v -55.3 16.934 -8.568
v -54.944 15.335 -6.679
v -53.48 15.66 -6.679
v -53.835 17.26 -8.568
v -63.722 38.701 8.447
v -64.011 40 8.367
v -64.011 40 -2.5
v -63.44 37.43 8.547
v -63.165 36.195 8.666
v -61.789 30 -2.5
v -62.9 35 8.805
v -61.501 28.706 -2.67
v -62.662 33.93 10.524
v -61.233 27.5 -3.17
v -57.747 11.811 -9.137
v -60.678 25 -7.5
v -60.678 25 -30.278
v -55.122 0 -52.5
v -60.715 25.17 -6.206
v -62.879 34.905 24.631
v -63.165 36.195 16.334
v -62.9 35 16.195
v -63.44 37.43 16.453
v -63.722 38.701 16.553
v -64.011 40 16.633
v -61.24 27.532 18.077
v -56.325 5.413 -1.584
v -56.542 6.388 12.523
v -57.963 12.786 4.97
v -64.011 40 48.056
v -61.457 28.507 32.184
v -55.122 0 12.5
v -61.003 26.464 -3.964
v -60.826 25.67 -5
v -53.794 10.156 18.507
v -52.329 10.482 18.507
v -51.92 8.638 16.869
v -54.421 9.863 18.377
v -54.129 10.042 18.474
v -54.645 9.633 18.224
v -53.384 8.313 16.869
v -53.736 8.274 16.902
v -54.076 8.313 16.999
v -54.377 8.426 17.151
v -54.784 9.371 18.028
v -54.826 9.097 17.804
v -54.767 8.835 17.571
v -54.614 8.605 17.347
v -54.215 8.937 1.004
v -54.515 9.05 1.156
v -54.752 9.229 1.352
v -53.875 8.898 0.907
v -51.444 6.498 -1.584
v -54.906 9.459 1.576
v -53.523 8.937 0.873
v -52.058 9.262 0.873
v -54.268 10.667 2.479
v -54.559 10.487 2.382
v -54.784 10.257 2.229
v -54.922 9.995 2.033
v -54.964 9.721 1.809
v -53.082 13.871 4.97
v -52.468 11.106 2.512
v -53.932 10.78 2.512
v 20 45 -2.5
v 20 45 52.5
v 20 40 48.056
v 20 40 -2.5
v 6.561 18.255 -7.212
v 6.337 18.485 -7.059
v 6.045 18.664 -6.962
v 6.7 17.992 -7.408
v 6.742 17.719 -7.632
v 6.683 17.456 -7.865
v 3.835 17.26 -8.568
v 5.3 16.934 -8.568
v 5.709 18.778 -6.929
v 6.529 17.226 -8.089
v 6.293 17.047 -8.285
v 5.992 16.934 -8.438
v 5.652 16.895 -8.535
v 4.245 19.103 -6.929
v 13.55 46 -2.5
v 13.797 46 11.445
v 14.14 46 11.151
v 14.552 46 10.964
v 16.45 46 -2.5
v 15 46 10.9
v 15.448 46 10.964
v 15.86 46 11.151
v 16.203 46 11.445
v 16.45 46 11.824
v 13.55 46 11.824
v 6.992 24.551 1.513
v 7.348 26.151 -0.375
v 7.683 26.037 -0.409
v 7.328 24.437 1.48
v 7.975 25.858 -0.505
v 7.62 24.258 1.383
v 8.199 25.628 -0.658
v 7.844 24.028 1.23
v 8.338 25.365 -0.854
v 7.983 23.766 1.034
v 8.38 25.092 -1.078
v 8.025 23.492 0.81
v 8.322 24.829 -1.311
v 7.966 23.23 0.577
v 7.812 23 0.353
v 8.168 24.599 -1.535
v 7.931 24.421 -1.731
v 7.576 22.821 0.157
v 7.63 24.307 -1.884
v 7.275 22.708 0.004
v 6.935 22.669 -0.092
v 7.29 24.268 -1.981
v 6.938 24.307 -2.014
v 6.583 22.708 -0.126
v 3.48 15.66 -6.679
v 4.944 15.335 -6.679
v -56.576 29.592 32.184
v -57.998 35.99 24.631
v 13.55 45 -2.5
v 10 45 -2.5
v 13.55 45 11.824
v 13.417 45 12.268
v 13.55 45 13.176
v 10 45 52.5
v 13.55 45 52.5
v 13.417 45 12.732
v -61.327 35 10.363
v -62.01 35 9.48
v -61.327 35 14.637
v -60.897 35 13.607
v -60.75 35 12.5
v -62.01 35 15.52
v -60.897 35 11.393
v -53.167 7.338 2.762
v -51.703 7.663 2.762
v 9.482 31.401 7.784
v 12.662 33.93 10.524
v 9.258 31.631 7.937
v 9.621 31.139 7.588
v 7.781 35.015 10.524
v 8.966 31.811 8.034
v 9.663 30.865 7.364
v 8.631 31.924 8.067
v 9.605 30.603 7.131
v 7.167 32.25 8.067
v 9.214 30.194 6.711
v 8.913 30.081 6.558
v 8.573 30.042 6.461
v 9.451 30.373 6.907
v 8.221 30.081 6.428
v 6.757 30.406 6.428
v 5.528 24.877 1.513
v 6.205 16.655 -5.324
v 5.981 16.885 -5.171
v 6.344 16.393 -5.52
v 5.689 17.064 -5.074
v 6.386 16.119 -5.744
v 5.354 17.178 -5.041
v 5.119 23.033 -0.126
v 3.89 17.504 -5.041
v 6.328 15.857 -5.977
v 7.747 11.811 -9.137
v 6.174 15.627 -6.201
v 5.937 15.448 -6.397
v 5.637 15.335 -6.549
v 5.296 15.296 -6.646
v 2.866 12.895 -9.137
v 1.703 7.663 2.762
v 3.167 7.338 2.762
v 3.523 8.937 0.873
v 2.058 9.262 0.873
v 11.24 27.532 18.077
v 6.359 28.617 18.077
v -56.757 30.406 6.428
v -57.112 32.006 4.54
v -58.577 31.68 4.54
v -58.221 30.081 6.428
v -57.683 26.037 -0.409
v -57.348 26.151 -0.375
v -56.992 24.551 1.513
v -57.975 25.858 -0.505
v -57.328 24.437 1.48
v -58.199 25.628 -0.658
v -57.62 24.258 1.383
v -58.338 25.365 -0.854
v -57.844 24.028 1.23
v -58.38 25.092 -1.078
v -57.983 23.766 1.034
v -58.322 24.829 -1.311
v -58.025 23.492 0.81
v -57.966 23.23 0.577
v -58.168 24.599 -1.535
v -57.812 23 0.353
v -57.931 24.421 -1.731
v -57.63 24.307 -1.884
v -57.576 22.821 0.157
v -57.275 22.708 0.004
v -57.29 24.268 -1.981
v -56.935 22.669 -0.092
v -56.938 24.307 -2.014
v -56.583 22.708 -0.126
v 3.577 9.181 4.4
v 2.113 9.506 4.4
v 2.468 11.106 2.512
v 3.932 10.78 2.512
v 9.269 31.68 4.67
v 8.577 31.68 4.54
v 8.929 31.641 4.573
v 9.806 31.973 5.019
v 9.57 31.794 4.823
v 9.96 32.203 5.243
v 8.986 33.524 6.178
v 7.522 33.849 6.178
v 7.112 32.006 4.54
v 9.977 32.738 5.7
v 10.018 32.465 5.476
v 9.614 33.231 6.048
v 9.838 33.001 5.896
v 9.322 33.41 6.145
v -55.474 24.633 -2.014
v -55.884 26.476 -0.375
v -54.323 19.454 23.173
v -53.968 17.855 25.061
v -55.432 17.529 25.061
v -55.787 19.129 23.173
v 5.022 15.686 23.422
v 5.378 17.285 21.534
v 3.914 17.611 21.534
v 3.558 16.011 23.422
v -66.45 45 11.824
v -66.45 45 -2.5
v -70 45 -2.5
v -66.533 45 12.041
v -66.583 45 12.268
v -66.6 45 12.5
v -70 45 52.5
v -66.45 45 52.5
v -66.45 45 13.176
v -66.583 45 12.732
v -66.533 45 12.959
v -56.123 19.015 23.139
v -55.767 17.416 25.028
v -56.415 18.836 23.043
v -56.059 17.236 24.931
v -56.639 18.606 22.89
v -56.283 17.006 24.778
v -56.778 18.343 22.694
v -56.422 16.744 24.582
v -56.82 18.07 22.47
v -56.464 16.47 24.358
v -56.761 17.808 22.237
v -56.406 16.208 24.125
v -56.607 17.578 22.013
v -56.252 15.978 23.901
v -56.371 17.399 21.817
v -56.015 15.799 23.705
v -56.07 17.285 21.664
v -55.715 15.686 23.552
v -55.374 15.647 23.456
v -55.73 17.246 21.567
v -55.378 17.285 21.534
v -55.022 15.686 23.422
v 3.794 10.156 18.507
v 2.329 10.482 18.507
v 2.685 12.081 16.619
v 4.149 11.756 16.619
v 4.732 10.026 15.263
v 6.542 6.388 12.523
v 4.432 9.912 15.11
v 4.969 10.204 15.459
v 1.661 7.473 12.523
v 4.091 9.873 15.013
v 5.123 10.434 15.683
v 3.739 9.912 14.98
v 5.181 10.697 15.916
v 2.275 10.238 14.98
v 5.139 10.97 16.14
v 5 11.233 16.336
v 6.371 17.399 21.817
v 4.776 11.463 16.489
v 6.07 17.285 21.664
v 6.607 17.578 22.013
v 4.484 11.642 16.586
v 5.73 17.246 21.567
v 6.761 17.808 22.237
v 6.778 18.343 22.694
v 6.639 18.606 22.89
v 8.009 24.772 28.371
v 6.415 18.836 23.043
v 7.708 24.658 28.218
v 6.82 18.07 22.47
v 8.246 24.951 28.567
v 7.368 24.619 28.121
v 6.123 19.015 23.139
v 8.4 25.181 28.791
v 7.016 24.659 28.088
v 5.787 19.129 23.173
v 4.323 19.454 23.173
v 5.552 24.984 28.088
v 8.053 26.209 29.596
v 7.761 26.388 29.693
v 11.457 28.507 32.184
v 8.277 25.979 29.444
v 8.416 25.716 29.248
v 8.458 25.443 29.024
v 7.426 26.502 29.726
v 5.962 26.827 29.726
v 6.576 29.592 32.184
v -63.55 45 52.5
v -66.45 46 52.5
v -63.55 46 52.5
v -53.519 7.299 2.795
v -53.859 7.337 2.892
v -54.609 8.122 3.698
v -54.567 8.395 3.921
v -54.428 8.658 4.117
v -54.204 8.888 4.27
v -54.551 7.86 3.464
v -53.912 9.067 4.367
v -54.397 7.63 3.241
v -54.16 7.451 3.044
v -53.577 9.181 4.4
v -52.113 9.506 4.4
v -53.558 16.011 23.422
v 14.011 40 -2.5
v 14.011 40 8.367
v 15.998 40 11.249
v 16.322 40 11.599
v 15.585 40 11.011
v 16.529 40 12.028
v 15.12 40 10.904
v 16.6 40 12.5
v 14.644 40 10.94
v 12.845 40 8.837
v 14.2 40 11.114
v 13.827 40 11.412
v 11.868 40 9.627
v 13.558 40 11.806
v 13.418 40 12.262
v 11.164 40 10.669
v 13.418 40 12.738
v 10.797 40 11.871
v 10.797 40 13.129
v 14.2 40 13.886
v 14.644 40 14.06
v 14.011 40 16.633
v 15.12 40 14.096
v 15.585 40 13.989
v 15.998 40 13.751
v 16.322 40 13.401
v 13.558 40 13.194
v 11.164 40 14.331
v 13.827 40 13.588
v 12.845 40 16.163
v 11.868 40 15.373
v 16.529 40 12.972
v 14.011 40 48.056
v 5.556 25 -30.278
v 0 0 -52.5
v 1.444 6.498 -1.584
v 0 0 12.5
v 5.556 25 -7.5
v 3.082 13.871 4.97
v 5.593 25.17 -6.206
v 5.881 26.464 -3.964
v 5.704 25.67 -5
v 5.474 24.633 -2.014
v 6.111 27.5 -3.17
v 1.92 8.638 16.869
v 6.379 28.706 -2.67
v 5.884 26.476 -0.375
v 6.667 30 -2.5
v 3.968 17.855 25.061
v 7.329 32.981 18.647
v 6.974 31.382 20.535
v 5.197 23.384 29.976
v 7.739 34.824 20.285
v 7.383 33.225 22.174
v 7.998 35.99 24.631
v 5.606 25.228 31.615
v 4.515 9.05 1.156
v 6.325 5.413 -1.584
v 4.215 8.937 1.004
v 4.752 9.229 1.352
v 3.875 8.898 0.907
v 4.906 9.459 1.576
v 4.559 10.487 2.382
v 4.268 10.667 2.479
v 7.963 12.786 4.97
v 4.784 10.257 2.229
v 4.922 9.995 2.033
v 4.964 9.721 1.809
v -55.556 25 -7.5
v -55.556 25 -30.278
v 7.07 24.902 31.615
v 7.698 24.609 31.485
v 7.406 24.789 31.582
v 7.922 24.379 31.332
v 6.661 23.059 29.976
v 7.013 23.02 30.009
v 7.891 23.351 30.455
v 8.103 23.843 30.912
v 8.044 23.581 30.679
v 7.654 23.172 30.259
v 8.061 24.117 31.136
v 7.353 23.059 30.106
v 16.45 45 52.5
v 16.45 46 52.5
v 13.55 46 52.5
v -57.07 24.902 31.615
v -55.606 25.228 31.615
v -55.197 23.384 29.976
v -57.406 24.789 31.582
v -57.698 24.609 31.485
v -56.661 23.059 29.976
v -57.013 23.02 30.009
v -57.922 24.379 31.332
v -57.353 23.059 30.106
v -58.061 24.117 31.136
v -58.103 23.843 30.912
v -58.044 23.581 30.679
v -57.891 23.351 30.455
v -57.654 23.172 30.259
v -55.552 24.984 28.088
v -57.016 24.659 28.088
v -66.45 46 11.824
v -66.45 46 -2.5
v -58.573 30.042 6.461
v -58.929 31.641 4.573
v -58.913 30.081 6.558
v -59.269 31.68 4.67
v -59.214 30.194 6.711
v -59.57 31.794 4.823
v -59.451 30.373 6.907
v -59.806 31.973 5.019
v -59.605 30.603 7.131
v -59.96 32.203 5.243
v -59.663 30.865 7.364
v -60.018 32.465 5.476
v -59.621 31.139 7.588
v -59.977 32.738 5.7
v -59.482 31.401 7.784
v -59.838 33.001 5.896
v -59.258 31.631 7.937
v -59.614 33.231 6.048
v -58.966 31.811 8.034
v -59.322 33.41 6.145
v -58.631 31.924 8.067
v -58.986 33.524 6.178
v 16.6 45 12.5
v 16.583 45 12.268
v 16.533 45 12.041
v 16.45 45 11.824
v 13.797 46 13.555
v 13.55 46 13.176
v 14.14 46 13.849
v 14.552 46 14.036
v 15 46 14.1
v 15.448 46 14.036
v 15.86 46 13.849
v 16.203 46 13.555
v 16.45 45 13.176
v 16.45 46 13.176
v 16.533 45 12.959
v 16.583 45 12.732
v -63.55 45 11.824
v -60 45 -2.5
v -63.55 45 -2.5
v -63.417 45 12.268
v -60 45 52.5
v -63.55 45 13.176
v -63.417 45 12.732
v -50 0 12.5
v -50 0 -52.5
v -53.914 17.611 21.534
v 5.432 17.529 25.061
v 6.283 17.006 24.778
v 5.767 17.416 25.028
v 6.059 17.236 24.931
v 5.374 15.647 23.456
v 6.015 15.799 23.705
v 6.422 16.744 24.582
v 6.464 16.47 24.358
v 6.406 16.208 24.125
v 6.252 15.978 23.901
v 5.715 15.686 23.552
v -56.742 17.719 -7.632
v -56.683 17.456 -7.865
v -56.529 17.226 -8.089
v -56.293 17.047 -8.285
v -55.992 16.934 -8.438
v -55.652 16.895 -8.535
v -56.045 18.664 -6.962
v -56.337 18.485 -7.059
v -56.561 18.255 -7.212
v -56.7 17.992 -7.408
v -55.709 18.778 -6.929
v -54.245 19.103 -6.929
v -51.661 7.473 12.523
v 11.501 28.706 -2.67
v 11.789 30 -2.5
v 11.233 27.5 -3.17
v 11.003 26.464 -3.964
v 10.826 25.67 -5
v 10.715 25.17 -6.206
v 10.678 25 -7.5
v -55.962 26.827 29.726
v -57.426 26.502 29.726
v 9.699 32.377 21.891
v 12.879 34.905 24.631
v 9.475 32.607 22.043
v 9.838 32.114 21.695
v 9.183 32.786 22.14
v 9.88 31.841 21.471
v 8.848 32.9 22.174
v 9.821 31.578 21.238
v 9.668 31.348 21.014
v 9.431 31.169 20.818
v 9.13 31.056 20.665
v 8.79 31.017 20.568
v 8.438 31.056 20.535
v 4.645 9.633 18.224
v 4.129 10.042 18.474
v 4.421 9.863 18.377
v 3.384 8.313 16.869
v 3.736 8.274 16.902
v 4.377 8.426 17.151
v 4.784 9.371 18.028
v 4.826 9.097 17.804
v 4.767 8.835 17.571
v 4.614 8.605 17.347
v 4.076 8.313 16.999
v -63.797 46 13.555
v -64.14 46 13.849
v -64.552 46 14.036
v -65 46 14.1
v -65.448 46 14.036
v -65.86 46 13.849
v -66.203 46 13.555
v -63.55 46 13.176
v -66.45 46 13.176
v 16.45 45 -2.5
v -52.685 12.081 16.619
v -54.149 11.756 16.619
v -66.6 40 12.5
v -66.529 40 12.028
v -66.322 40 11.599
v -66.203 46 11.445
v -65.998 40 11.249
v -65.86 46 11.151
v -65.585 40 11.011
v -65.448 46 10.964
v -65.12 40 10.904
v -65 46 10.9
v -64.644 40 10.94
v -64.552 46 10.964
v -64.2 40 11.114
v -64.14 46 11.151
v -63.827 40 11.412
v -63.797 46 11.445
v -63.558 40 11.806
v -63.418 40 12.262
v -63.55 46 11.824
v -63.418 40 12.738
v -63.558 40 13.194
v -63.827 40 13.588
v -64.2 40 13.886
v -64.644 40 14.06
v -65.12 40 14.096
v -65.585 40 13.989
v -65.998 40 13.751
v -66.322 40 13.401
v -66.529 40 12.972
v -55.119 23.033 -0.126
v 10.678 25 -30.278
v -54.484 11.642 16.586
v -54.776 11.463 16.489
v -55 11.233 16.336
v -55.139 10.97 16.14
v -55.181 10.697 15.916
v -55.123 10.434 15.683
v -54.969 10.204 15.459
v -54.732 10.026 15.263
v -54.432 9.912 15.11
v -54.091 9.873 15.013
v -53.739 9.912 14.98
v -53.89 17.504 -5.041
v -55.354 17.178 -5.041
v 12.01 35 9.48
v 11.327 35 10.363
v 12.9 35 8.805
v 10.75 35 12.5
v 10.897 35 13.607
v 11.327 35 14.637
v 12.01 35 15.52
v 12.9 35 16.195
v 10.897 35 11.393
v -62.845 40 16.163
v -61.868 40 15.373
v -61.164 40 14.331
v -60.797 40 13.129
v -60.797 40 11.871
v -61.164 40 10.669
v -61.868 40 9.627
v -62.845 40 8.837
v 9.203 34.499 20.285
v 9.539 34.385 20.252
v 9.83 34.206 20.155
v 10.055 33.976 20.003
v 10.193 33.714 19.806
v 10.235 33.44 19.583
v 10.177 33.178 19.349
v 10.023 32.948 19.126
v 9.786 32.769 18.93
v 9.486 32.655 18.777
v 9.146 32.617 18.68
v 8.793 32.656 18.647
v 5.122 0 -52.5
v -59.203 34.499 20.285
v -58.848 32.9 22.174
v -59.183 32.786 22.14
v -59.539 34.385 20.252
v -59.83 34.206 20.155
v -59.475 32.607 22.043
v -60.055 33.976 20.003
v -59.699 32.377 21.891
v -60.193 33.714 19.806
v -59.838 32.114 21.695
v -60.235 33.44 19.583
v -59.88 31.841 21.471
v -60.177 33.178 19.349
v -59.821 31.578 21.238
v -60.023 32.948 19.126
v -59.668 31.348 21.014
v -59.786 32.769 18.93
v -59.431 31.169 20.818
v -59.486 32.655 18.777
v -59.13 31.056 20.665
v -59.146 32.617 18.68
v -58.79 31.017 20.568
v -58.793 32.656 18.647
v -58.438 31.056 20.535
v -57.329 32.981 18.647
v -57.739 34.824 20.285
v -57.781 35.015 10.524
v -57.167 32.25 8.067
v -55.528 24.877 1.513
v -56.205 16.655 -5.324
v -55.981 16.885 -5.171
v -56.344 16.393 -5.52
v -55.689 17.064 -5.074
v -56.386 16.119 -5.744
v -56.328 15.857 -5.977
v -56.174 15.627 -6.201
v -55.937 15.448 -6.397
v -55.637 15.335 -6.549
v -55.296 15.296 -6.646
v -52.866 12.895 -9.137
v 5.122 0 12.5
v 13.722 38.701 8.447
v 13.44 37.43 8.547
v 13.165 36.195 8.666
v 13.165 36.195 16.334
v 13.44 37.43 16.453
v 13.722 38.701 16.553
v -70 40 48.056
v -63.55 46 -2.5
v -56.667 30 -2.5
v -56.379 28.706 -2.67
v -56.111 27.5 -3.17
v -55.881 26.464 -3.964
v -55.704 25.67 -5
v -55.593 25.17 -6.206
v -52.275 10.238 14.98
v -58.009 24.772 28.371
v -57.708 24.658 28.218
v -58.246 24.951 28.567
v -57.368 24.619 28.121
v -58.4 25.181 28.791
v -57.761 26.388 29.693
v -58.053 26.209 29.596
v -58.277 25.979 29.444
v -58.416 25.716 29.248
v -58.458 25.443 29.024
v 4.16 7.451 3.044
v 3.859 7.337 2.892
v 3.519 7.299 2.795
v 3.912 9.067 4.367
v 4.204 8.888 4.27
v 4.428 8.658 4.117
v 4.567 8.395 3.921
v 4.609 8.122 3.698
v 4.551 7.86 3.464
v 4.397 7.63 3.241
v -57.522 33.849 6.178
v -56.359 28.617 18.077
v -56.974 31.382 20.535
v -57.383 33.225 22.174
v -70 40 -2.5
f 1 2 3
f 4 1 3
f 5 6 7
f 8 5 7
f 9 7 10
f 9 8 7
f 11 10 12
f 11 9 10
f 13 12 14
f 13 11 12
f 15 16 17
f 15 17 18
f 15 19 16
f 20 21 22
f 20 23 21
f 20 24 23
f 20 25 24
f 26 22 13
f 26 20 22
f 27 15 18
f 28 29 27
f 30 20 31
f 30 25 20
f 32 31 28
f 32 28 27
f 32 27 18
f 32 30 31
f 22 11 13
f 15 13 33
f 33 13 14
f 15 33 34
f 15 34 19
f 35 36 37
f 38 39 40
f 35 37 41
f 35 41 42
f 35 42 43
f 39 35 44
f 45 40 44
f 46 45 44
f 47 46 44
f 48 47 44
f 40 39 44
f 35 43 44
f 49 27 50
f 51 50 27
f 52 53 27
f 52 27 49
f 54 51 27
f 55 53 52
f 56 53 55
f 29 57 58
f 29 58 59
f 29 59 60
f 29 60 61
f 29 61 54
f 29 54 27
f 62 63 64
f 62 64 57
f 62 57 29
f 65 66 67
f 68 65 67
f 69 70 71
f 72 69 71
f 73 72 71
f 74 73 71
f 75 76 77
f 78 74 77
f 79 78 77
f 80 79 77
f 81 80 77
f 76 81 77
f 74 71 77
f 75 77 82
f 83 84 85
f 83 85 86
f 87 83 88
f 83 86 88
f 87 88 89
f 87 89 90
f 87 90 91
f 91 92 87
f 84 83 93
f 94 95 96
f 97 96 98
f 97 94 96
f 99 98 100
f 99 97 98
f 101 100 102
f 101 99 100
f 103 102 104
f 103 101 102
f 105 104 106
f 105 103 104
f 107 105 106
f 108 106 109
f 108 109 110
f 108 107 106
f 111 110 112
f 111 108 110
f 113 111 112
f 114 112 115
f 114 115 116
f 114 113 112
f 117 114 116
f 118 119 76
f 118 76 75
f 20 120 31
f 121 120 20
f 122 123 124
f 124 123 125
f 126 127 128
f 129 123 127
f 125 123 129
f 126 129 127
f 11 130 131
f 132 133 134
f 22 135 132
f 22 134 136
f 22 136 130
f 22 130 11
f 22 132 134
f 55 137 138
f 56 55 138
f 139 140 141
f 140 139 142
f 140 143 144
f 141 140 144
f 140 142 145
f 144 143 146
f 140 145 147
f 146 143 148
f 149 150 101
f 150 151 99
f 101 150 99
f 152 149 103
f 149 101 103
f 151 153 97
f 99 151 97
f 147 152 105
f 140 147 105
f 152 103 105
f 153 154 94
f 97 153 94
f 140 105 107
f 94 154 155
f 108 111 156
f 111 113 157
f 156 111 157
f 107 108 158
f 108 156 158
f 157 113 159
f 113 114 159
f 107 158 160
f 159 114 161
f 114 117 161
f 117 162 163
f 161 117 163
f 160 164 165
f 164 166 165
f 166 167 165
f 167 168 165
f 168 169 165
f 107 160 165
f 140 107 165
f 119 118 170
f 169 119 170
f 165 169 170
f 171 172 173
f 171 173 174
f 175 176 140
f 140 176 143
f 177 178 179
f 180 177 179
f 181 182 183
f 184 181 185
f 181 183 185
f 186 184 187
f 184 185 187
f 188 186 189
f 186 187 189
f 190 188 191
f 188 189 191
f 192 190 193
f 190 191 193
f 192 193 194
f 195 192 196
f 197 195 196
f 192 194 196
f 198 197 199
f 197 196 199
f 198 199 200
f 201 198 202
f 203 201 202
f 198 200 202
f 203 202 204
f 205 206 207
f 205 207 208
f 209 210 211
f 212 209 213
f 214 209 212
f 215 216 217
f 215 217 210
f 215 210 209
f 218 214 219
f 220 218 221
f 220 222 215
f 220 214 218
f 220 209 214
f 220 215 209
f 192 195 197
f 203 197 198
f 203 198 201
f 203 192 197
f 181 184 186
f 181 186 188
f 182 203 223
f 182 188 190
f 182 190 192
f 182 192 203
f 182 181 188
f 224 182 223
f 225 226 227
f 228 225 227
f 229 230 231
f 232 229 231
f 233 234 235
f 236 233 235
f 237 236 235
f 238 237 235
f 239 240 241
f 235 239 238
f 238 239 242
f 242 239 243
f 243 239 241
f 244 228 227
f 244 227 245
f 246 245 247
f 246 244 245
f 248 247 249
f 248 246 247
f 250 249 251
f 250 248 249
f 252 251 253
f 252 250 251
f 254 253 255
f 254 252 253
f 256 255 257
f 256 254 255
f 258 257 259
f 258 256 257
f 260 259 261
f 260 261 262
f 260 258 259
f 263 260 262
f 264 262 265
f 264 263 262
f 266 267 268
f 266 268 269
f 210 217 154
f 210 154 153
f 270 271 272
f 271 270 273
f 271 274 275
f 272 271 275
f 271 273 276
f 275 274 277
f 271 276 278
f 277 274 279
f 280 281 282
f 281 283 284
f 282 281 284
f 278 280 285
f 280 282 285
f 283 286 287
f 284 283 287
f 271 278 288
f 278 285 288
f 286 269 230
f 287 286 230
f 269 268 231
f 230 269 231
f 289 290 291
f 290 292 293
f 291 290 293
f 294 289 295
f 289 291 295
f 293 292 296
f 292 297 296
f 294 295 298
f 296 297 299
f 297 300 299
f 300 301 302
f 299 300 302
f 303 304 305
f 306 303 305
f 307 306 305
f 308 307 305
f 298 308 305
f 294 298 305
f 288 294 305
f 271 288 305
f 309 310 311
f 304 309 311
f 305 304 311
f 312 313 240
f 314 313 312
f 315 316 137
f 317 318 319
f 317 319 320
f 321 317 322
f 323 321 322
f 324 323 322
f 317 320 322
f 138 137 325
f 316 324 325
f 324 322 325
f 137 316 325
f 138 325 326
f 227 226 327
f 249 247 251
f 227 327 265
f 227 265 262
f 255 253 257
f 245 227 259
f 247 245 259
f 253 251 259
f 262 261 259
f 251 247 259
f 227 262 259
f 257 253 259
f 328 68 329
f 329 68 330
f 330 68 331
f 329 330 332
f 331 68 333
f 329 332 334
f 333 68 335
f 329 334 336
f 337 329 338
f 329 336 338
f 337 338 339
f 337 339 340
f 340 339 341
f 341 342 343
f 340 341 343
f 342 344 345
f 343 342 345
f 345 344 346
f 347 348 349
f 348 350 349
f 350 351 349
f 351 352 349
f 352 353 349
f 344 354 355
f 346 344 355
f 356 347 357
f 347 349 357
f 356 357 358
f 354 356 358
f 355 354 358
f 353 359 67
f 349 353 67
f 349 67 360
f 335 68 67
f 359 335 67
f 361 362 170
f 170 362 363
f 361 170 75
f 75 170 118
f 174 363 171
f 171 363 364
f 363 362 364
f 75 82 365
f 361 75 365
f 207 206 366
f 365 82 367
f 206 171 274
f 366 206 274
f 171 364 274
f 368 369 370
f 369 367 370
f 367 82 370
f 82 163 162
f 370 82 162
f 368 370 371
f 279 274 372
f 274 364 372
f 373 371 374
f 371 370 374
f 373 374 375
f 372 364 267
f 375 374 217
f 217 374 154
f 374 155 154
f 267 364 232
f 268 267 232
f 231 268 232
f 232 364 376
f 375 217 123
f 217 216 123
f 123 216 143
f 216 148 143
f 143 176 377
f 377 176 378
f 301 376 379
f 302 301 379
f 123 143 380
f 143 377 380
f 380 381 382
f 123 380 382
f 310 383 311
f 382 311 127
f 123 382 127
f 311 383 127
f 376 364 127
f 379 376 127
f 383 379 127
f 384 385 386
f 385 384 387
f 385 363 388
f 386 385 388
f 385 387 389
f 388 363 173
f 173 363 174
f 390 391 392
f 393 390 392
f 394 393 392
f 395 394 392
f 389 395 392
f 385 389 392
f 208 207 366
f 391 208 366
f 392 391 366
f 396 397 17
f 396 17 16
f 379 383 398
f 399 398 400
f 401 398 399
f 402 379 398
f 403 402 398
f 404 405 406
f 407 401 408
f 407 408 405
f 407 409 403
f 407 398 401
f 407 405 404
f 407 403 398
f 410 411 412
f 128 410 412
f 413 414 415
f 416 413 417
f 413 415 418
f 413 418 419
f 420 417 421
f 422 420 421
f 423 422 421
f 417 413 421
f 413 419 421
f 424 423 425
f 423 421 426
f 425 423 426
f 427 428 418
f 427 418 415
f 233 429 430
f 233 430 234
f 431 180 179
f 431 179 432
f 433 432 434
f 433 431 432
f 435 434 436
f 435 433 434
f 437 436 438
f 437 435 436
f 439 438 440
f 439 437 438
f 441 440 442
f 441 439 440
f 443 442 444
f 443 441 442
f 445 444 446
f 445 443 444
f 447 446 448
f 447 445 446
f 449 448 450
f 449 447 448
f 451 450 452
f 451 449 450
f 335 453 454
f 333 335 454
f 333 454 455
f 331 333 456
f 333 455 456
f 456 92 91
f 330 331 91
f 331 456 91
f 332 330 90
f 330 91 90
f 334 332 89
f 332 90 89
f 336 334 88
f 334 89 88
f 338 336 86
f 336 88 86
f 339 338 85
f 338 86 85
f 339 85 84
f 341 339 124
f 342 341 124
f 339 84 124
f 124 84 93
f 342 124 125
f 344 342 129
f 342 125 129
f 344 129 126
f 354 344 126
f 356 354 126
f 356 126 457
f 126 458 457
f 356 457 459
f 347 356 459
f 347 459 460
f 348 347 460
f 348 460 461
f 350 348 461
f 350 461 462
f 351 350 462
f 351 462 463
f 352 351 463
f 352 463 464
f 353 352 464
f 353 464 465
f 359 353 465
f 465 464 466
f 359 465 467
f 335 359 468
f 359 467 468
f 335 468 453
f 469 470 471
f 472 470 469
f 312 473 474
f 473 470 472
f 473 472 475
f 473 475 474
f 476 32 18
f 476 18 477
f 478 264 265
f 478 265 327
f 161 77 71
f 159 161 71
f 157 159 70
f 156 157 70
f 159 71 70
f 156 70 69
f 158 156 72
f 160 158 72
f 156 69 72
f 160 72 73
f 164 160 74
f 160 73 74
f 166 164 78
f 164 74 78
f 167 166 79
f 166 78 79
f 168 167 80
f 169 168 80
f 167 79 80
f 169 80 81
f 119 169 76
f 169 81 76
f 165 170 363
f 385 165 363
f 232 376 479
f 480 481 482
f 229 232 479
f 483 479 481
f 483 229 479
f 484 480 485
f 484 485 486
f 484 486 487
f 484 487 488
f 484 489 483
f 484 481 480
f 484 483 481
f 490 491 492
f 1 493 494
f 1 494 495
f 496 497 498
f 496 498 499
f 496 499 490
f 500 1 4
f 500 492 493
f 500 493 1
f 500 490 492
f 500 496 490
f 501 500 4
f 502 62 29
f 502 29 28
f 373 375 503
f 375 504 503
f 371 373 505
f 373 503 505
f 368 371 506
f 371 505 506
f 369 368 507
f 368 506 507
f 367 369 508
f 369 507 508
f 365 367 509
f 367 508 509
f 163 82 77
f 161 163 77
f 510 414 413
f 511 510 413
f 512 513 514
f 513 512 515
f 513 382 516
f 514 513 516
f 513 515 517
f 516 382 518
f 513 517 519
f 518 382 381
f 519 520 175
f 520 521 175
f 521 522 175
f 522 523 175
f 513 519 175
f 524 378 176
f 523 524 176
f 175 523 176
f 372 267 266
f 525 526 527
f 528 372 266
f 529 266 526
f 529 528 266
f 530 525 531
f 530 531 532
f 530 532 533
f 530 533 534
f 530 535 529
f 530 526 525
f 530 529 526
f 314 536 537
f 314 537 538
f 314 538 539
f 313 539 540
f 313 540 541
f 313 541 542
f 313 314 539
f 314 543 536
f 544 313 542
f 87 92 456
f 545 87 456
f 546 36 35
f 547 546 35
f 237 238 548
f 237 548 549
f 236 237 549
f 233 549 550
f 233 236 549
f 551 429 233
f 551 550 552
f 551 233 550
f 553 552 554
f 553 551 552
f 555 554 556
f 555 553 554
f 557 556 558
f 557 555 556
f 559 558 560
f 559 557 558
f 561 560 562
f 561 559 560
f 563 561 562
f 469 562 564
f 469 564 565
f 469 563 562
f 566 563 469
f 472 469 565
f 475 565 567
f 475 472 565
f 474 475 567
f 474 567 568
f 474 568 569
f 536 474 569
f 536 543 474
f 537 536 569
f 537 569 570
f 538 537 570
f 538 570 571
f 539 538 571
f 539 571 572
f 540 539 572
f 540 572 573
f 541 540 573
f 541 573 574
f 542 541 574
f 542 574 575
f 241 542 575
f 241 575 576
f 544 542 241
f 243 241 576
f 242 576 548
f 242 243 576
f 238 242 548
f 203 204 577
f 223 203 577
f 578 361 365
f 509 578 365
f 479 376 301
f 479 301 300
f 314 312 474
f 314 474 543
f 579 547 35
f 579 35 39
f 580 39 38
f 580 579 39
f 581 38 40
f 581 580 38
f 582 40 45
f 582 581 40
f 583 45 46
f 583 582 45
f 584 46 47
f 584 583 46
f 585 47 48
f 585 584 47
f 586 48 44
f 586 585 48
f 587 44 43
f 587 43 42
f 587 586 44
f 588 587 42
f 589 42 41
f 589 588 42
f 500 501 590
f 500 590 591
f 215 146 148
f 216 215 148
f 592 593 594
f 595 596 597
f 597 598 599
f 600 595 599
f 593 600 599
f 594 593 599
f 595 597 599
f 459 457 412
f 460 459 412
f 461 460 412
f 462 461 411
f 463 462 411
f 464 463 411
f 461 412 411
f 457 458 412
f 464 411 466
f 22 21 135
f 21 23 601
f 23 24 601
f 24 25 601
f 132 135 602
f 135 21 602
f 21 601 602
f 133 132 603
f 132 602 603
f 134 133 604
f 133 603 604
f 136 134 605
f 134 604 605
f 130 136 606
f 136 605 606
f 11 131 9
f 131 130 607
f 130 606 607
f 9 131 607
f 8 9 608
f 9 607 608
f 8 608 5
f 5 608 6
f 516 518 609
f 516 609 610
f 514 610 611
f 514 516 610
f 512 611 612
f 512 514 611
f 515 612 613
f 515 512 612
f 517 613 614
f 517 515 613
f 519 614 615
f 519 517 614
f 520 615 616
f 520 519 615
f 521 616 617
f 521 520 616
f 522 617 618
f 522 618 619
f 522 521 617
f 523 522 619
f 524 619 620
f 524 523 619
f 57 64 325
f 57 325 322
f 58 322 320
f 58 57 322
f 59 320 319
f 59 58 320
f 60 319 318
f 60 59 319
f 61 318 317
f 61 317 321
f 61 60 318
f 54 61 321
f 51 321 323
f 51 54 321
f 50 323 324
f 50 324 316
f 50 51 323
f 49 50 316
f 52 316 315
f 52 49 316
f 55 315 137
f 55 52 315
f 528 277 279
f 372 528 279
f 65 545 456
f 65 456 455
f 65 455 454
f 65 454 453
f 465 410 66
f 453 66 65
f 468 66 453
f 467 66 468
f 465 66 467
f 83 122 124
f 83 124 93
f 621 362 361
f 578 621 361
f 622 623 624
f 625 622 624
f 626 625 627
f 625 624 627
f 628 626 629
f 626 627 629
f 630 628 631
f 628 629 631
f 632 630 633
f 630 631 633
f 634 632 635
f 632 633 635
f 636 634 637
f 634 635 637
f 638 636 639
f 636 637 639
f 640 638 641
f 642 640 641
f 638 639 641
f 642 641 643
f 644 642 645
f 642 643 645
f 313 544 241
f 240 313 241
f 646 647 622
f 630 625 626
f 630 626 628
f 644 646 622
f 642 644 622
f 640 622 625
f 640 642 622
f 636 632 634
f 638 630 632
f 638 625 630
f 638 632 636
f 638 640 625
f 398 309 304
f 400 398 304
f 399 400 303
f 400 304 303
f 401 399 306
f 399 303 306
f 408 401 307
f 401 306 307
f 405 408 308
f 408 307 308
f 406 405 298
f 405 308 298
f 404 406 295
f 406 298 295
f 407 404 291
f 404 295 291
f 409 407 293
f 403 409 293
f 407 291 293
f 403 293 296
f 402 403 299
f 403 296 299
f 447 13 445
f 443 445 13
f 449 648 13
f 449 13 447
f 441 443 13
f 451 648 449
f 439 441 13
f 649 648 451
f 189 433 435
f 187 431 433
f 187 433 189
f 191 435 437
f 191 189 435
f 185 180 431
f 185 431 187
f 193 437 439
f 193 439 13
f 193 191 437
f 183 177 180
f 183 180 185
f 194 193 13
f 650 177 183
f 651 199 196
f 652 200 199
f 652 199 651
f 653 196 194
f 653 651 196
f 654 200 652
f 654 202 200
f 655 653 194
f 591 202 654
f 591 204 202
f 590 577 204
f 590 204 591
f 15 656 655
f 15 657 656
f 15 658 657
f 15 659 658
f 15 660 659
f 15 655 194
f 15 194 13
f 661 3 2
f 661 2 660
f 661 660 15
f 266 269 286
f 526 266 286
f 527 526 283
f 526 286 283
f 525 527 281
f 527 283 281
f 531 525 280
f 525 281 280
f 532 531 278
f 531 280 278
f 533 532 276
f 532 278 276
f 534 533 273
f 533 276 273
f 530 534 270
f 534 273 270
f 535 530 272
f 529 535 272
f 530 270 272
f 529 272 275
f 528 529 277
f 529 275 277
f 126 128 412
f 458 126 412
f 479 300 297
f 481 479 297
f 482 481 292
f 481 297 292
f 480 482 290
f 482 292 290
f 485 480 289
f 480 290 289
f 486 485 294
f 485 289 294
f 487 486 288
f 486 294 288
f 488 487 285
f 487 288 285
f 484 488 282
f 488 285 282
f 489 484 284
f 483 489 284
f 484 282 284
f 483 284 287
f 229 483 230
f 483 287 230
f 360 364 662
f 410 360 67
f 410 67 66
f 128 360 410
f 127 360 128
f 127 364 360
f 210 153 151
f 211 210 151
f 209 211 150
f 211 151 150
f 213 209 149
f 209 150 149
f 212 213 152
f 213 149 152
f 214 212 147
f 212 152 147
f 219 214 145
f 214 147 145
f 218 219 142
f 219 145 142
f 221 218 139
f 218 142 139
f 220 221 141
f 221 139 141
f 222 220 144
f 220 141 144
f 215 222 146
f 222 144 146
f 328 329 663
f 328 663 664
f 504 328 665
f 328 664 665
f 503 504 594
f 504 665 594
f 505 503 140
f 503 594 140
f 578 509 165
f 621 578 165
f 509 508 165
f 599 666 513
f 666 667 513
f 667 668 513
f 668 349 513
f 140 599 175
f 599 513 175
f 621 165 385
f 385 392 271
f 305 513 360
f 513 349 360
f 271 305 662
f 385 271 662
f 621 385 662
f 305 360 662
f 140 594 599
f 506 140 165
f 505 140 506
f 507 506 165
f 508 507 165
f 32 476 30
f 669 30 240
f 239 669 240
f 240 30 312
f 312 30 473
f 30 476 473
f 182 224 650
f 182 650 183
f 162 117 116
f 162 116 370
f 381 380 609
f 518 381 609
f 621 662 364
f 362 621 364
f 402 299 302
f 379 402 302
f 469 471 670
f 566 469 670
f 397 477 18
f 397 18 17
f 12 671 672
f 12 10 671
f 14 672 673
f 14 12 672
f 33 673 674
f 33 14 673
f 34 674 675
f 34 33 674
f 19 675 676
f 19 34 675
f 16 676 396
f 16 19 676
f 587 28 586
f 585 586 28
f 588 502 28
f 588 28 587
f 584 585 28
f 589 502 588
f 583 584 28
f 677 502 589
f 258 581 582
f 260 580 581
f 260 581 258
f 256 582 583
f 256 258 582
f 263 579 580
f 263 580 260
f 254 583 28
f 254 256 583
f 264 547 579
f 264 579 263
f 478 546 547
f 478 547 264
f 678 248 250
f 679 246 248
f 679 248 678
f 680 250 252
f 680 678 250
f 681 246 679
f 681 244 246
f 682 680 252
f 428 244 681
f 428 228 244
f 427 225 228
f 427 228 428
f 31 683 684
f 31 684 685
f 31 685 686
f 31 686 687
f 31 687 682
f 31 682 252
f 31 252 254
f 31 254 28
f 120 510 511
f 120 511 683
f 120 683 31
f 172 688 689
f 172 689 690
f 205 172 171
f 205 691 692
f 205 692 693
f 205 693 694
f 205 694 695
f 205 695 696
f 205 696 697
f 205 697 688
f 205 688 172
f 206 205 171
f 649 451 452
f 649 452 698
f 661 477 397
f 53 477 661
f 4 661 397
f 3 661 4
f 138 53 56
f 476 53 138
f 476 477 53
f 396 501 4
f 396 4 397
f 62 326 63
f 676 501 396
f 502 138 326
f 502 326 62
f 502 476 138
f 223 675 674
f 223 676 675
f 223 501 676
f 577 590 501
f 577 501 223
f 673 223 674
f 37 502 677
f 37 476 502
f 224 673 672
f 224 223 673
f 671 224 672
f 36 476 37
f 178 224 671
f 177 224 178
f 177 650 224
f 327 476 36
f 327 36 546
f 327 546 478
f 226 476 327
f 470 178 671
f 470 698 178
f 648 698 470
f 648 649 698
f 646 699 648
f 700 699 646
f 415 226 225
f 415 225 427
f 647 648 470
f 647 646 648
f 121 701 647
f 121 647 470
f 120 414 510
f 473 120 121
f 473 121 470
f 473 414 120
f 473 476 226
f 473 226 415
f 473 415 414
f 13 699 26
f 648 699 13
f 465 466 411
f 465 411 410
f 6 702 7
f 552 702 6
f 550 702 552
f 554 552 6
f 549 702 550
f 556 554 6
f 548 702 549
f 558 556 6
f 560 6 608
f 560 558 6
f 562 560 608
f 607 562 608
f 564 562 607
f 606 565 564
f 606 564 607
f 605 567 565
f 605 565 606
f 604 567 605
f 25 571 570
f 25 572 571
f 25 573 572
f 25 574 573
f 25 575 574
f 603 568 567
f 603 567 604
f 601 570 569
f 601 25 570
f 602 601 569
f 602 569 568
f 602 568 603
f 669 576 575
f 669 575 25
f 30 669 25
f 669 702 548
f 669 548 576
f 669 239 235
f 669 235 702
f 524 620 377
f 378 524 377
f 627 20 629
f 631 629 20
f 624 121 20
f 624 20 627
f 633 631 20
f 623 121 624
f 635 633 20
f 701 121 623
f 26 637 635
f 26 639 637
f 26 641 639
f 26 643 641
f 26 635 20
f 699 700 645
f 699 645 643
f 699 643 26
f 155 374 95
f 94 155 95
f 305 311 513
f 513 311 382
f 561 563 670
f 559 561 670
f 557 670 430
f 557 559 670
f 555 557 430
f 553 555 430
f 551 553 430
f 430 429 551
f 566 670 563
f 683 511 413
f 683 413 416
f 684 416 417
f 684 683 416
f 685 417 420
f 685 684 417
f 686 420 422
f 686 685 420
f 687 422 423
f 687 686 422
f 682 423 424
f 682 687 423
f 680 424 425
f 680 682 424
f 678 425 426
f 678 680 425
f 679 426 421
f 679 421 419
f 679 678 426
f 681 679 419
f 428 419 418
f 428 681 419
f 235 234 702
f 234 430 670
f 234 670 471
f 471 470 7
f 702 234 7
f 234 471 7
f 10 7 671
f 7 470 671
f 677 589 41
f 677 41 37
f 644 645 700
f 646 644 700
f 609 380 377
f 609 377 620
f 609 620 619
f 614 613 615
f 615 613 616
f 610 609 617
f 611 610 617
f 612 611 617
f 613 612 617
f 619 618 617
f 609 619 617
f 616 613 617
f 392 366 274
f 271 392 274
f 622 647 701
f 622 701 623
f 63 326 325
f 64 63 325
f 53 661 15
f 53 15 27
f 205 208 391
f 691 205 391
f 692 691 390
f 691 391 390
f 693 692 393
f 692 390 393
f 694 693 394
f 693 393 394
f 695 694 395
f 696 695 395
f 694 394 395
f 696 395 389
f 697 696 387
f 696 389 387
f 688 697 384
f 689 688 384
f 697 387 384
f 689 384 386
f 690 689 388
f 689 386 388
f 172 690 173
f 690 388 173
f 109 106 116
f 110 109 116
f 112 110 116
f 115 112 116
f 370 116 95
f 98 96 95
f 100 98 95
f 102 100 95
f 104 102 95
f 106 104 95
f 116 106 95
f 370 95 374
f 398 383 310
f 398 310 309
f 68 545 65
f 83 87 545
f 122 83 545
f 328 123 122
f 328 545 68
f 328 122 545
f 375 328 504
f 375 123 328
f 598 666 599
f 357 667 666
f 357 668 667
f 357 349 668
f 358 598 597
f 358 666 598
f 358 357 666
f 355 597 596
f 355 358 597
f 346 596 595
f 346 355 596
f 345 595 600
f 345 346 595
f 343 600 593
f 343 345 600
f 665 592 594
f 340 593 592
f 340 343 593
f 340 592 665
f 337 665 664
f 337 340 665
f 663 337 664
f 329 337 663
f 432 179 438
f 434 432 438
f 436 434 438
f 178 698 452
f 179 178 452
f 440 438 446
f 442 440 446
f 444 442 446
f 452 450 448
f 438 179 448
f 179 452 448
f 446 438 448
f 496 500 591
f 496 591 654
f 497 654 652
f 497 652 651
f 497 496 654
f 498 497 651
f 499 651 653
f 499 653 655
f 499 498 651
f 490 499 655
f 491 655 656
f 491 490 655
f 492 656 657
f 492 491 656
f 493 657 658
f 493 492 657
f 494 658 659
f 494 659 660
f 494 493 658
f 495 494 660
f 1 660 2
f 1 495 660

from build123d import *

# Parameters (mm, degrees)
MAIN_DEPTH               = 52.5
SKETCH3_R                = 1.6
MAKERBEAMFIXHOLES_DEPTH  = 47
SIDECUT_DEPTH            = 21
SIDECUT_DEPTH_BACK       = 1
CENTRALCUT_DEPTH         = 10
ROLLERSUPPORTHOLES_DEPTH = 2.5
LPATTERN1_COUNT          = 3
LPATTERN1_PITCH          = 10
CUT_EXTRUDE1_DEPTH       = 25
CUT_EXTRUDE2_DEPTH       = 25
CUT_EXTRUDE3_DEPTH       = 7.5
SKETCH10_R               = 4.25
CUT_EXTRUDE5_DEPTH       = 5
SKETCH11_W               = 27.777777778
SKETCH11_H               = 35
CUT_EXTRUDE6_DEPTH       = 46
CUT_EXTRUDE6_DEPTH_BACK  = 1
FILLET1_R                = 5


with BuildPart() as part:
    # Sketch1 → Main (new body, symmetric)
    with BuildSketch(Plane.XY):
        Polygon((20, 45), (20, 40), (14.010858032, 40), (5.121969143, 0), (0, 0), (10, 45), (13.55, 45), (13.55, 46), (16.45, 46), (16.45, 45), align=None)
    extrude(amount=MAIN_DEPTH, both=True)

    # Sketch3 → MakerBeamFixHoles (cut, through all)
    with BuildSketch(Plane(origin=(0, 46, 0), x_dir=(1, 0, 0), z_dir=(0, 1, 0))):
        with Locations((15, -12.5)):
            Circle(SKETCH3_R)
    extrude(amount=-MAKERBEAMFIXHOLES_DEPTH, mode=Mode.SUBTRACT)

    # Sketch2 → SideCut (cut, two sides)
    with BuildSketch(Plane(origin=(0, 40.615528128, 0), x_dir=(0, 0, 1), z_dir=(1, 0, 0))) as sidecut_sk:
        Polygon((-52.5, 40.615528128), (-12.5, -4.384471872), (-12.5, -5.384471872), (-52.5, -5.384471872), align=None)
        Polygon((52.5, -4.384471872), (52.5, 40.615528128), (12.5, 40.615528128), align=None)
    extrude(amount=SIDECUT_DEPTH, mode=Mode.SUBTRACT)
    extrude(sidecut_sk.sketch, amount=-SIDECUT_DEPTH_BACK, mode=Mode.SUBTRACT)

    # Sketch5 → CentralCut (cut)
    with BuildSketch(Plane(origin=(0, 0, 0), x_dir=(0, 0, 1), z_dir=(-0.97618706, 0.216930458, 0))):
        Polygon((24.631214246, 36.867825412), (18.077358881, 29.3148803), (10.524413769, 35.868735664), (-9.137152323, 13.209900328), (-1.584207211, 6.656044963), (4.969648153, 14.208990076), (12.522593265, 7.655134711), (32.184159358, 30.313970048), align=None)
    extrude(amount=-CENTRALCUT_DEPTH, mode=Mode.SUBTRACT)

    # Sketch4 → RollerSupportHoles (cut)
    with BuildSketch(Plane(origin=(-0.631416457, 4.658737233, 9.707435372), x_dir=(-0.989841813, 0.091892801, -0.108484557), z_dir=(-0.142173084, -0.63977888, 0.755294511))):
        with BuildLine():
            Line((-6.246856698, -27.389225103), (-6.660676315, -29.854737894))
            Line((-6.660676315, -29.854737894), (-8.13998399, -29.606446124))
            ThreePointArc((-8.13998399, -29.606446124), (-9.165830577, -28.166779919), (-7.726164372, -27.140933332))
            Line((-7.726164372, -27.140933332), (-6.246856698, -27.389225103))
        make_face()
    rollersupportholes = extrude(amount=ROLLERSUPPORTHOLES_DEPTH, mode=Mode.SUBTRACT)

    # LPattern1: RollerSupportHoles ×3
    with Locations(*[Vector(-0.163846384, -0.737308728, -0.655385536) * (i * LPATTERN1_PITCH) for i in range(1, LPATTERN1_COUNT)]):
        add(rollersupportholes, mode=Mode.SUBTRACT)

    # Sketch6 → Cut-Extrude1 (cut)
    with BuildSketch(Plane(origin=(-0.986849168, -4.440821256, 5.242636205), x_dir=(-0.989841813, 0.091892801, -0.108484557), z_dir=(0.142173084, 0.63977888, -0.755294511))):
        with BuildLine():
            Line((-5.005397845, 29.821864147), (-4.591578228, 27.356351355))
            Line((-4.591578228, 27.356351355), (-6.070885903, 27.108059585))
            ThreePointArc((-6.070885903, 27.108059585), (-7.510552107, 28.133906172), (-6.48470552, 29.573572376))
            Line((-6.48470552, 29.573572376), (-5.005397845, 29.821864147))
        make_face()
    extrude(amount=CUT_EXTRUDE1_DEPTH, mode=Mode.SUBTRACT)

    # Mirror5: RollerSupportHoles across plane
    add(rollersupportholes.mirror(Plane(origin=(0.079448965, 0.357520344, -0.422072629), x_dir=(0.163846384, 0.737308728, 0.655385536), z_dir=(0.142173084, 0.63977888, -0.755294511))), mode=Mode.SUBTRACT)

    # Sketch7 → Cut-Extrude2 (cut)
    with BuildSketch(Plane(origin=(-0.986849168, -4.440821256, 5.242636205), x_dir=(-0.989841813, 0.091892801, -0.108484557), z_dir=(0.142173084, 0.63977888, -0.755294511))):
        with BuildLine():
            Line((-4.415607433, 17.246008419), (-2.936299758, 17.49430019))
            Line((-2.936299758, 17.49430019), (-3.350119375, 19.959812981))
            Line((-3.350119375, 19.959812981), (-4.82942705, 19.711521211))
            ThreePointArc((-4.82942705, 19.711521211), (-5.855273637, 18.271855006), (-4.415607433, 17.246008419))
        make_face()
    extrude(amount=CUT_EXTRUDE2_DEPTH, mode=Mode.SUBTRACT)

    # Sketch8 → Cut-Extrude3 (cut, symmetric)
    with BuildSketch(Plane(origin=(1.50117981, 6.755309145, -7.975017741), x_dir=(-0.989841813, 0.091892801, -0.108484557), z_dir=(0.142173084, 0.63977888, -0.755294511))):
        with BuildLine():
            Line((-2.760328963, 7.383957254), (-1.281021288, 7.632249025))
            Line((-1.281021288, 7.632249025), (-1.694840906, 10.097761816))
            Line((-1.694840906, 10.097761816), (-3.17414858, 9.849470045))
            ThreePointArc((-3.17414858, 9.849470045), (-4.199995167, 8.409803841), (-2.760328963, 7.383957254))
        make_face()
    extrude(amount=CUT_EXTRUDE3_DEPTH, both=True, mode=Mode.SUBTRACT)

    # Sketch10 → Cut-Extrude5 (cut)
    with BuildSketch(Plane.XZ.offset(-40)):
        with Locations((15, 12.5)):
            Circle(SKETCH10_R)
    extrude(amount=CUT_EXTRUDE5_DEPTH, mode=Mode.SUBTRACT)

    # Sketch11 → Cut-Extrude6 (cut, two sides)
    with BuildSketch(Plane(origin=(-25, -227.744305716, 0), x_dir=(0, 0, 1), z_dir=(1, 0, 0))) as cut_extrude6_sk:
        with Locations((-16.388888889, -270.244305716)):
            Rectangle(SKETCH11_W, SKETCH11_H)
    extrude(amount=CUT_EXTRUDE6_DEPTH, mode=Mode.SUBTRACT)
    extrude(cut_extrude6_sk.sketch, amount=-CUT_EXTRUDE6_DEPTH_BACK, mode=Mode.SUBTRACT)

    # Fillet1
    fillet1_edges = [part.edges().sort_by_distance(p)[0] for p in [
        (8.116540127, 25, -2.5),
    ]]
    fillet(fillet1_edges, radius=FILLET1_R)


with BuildPart() as body_2:
    # Mirror7: mirrored copy
    add(part.part.mirror(Plane(origin=(-25, 0, 0), x_dir=(0, 0, 1), z_dir=(1, 0, 0))))


solid = Compound([part.part, body_2.part])
